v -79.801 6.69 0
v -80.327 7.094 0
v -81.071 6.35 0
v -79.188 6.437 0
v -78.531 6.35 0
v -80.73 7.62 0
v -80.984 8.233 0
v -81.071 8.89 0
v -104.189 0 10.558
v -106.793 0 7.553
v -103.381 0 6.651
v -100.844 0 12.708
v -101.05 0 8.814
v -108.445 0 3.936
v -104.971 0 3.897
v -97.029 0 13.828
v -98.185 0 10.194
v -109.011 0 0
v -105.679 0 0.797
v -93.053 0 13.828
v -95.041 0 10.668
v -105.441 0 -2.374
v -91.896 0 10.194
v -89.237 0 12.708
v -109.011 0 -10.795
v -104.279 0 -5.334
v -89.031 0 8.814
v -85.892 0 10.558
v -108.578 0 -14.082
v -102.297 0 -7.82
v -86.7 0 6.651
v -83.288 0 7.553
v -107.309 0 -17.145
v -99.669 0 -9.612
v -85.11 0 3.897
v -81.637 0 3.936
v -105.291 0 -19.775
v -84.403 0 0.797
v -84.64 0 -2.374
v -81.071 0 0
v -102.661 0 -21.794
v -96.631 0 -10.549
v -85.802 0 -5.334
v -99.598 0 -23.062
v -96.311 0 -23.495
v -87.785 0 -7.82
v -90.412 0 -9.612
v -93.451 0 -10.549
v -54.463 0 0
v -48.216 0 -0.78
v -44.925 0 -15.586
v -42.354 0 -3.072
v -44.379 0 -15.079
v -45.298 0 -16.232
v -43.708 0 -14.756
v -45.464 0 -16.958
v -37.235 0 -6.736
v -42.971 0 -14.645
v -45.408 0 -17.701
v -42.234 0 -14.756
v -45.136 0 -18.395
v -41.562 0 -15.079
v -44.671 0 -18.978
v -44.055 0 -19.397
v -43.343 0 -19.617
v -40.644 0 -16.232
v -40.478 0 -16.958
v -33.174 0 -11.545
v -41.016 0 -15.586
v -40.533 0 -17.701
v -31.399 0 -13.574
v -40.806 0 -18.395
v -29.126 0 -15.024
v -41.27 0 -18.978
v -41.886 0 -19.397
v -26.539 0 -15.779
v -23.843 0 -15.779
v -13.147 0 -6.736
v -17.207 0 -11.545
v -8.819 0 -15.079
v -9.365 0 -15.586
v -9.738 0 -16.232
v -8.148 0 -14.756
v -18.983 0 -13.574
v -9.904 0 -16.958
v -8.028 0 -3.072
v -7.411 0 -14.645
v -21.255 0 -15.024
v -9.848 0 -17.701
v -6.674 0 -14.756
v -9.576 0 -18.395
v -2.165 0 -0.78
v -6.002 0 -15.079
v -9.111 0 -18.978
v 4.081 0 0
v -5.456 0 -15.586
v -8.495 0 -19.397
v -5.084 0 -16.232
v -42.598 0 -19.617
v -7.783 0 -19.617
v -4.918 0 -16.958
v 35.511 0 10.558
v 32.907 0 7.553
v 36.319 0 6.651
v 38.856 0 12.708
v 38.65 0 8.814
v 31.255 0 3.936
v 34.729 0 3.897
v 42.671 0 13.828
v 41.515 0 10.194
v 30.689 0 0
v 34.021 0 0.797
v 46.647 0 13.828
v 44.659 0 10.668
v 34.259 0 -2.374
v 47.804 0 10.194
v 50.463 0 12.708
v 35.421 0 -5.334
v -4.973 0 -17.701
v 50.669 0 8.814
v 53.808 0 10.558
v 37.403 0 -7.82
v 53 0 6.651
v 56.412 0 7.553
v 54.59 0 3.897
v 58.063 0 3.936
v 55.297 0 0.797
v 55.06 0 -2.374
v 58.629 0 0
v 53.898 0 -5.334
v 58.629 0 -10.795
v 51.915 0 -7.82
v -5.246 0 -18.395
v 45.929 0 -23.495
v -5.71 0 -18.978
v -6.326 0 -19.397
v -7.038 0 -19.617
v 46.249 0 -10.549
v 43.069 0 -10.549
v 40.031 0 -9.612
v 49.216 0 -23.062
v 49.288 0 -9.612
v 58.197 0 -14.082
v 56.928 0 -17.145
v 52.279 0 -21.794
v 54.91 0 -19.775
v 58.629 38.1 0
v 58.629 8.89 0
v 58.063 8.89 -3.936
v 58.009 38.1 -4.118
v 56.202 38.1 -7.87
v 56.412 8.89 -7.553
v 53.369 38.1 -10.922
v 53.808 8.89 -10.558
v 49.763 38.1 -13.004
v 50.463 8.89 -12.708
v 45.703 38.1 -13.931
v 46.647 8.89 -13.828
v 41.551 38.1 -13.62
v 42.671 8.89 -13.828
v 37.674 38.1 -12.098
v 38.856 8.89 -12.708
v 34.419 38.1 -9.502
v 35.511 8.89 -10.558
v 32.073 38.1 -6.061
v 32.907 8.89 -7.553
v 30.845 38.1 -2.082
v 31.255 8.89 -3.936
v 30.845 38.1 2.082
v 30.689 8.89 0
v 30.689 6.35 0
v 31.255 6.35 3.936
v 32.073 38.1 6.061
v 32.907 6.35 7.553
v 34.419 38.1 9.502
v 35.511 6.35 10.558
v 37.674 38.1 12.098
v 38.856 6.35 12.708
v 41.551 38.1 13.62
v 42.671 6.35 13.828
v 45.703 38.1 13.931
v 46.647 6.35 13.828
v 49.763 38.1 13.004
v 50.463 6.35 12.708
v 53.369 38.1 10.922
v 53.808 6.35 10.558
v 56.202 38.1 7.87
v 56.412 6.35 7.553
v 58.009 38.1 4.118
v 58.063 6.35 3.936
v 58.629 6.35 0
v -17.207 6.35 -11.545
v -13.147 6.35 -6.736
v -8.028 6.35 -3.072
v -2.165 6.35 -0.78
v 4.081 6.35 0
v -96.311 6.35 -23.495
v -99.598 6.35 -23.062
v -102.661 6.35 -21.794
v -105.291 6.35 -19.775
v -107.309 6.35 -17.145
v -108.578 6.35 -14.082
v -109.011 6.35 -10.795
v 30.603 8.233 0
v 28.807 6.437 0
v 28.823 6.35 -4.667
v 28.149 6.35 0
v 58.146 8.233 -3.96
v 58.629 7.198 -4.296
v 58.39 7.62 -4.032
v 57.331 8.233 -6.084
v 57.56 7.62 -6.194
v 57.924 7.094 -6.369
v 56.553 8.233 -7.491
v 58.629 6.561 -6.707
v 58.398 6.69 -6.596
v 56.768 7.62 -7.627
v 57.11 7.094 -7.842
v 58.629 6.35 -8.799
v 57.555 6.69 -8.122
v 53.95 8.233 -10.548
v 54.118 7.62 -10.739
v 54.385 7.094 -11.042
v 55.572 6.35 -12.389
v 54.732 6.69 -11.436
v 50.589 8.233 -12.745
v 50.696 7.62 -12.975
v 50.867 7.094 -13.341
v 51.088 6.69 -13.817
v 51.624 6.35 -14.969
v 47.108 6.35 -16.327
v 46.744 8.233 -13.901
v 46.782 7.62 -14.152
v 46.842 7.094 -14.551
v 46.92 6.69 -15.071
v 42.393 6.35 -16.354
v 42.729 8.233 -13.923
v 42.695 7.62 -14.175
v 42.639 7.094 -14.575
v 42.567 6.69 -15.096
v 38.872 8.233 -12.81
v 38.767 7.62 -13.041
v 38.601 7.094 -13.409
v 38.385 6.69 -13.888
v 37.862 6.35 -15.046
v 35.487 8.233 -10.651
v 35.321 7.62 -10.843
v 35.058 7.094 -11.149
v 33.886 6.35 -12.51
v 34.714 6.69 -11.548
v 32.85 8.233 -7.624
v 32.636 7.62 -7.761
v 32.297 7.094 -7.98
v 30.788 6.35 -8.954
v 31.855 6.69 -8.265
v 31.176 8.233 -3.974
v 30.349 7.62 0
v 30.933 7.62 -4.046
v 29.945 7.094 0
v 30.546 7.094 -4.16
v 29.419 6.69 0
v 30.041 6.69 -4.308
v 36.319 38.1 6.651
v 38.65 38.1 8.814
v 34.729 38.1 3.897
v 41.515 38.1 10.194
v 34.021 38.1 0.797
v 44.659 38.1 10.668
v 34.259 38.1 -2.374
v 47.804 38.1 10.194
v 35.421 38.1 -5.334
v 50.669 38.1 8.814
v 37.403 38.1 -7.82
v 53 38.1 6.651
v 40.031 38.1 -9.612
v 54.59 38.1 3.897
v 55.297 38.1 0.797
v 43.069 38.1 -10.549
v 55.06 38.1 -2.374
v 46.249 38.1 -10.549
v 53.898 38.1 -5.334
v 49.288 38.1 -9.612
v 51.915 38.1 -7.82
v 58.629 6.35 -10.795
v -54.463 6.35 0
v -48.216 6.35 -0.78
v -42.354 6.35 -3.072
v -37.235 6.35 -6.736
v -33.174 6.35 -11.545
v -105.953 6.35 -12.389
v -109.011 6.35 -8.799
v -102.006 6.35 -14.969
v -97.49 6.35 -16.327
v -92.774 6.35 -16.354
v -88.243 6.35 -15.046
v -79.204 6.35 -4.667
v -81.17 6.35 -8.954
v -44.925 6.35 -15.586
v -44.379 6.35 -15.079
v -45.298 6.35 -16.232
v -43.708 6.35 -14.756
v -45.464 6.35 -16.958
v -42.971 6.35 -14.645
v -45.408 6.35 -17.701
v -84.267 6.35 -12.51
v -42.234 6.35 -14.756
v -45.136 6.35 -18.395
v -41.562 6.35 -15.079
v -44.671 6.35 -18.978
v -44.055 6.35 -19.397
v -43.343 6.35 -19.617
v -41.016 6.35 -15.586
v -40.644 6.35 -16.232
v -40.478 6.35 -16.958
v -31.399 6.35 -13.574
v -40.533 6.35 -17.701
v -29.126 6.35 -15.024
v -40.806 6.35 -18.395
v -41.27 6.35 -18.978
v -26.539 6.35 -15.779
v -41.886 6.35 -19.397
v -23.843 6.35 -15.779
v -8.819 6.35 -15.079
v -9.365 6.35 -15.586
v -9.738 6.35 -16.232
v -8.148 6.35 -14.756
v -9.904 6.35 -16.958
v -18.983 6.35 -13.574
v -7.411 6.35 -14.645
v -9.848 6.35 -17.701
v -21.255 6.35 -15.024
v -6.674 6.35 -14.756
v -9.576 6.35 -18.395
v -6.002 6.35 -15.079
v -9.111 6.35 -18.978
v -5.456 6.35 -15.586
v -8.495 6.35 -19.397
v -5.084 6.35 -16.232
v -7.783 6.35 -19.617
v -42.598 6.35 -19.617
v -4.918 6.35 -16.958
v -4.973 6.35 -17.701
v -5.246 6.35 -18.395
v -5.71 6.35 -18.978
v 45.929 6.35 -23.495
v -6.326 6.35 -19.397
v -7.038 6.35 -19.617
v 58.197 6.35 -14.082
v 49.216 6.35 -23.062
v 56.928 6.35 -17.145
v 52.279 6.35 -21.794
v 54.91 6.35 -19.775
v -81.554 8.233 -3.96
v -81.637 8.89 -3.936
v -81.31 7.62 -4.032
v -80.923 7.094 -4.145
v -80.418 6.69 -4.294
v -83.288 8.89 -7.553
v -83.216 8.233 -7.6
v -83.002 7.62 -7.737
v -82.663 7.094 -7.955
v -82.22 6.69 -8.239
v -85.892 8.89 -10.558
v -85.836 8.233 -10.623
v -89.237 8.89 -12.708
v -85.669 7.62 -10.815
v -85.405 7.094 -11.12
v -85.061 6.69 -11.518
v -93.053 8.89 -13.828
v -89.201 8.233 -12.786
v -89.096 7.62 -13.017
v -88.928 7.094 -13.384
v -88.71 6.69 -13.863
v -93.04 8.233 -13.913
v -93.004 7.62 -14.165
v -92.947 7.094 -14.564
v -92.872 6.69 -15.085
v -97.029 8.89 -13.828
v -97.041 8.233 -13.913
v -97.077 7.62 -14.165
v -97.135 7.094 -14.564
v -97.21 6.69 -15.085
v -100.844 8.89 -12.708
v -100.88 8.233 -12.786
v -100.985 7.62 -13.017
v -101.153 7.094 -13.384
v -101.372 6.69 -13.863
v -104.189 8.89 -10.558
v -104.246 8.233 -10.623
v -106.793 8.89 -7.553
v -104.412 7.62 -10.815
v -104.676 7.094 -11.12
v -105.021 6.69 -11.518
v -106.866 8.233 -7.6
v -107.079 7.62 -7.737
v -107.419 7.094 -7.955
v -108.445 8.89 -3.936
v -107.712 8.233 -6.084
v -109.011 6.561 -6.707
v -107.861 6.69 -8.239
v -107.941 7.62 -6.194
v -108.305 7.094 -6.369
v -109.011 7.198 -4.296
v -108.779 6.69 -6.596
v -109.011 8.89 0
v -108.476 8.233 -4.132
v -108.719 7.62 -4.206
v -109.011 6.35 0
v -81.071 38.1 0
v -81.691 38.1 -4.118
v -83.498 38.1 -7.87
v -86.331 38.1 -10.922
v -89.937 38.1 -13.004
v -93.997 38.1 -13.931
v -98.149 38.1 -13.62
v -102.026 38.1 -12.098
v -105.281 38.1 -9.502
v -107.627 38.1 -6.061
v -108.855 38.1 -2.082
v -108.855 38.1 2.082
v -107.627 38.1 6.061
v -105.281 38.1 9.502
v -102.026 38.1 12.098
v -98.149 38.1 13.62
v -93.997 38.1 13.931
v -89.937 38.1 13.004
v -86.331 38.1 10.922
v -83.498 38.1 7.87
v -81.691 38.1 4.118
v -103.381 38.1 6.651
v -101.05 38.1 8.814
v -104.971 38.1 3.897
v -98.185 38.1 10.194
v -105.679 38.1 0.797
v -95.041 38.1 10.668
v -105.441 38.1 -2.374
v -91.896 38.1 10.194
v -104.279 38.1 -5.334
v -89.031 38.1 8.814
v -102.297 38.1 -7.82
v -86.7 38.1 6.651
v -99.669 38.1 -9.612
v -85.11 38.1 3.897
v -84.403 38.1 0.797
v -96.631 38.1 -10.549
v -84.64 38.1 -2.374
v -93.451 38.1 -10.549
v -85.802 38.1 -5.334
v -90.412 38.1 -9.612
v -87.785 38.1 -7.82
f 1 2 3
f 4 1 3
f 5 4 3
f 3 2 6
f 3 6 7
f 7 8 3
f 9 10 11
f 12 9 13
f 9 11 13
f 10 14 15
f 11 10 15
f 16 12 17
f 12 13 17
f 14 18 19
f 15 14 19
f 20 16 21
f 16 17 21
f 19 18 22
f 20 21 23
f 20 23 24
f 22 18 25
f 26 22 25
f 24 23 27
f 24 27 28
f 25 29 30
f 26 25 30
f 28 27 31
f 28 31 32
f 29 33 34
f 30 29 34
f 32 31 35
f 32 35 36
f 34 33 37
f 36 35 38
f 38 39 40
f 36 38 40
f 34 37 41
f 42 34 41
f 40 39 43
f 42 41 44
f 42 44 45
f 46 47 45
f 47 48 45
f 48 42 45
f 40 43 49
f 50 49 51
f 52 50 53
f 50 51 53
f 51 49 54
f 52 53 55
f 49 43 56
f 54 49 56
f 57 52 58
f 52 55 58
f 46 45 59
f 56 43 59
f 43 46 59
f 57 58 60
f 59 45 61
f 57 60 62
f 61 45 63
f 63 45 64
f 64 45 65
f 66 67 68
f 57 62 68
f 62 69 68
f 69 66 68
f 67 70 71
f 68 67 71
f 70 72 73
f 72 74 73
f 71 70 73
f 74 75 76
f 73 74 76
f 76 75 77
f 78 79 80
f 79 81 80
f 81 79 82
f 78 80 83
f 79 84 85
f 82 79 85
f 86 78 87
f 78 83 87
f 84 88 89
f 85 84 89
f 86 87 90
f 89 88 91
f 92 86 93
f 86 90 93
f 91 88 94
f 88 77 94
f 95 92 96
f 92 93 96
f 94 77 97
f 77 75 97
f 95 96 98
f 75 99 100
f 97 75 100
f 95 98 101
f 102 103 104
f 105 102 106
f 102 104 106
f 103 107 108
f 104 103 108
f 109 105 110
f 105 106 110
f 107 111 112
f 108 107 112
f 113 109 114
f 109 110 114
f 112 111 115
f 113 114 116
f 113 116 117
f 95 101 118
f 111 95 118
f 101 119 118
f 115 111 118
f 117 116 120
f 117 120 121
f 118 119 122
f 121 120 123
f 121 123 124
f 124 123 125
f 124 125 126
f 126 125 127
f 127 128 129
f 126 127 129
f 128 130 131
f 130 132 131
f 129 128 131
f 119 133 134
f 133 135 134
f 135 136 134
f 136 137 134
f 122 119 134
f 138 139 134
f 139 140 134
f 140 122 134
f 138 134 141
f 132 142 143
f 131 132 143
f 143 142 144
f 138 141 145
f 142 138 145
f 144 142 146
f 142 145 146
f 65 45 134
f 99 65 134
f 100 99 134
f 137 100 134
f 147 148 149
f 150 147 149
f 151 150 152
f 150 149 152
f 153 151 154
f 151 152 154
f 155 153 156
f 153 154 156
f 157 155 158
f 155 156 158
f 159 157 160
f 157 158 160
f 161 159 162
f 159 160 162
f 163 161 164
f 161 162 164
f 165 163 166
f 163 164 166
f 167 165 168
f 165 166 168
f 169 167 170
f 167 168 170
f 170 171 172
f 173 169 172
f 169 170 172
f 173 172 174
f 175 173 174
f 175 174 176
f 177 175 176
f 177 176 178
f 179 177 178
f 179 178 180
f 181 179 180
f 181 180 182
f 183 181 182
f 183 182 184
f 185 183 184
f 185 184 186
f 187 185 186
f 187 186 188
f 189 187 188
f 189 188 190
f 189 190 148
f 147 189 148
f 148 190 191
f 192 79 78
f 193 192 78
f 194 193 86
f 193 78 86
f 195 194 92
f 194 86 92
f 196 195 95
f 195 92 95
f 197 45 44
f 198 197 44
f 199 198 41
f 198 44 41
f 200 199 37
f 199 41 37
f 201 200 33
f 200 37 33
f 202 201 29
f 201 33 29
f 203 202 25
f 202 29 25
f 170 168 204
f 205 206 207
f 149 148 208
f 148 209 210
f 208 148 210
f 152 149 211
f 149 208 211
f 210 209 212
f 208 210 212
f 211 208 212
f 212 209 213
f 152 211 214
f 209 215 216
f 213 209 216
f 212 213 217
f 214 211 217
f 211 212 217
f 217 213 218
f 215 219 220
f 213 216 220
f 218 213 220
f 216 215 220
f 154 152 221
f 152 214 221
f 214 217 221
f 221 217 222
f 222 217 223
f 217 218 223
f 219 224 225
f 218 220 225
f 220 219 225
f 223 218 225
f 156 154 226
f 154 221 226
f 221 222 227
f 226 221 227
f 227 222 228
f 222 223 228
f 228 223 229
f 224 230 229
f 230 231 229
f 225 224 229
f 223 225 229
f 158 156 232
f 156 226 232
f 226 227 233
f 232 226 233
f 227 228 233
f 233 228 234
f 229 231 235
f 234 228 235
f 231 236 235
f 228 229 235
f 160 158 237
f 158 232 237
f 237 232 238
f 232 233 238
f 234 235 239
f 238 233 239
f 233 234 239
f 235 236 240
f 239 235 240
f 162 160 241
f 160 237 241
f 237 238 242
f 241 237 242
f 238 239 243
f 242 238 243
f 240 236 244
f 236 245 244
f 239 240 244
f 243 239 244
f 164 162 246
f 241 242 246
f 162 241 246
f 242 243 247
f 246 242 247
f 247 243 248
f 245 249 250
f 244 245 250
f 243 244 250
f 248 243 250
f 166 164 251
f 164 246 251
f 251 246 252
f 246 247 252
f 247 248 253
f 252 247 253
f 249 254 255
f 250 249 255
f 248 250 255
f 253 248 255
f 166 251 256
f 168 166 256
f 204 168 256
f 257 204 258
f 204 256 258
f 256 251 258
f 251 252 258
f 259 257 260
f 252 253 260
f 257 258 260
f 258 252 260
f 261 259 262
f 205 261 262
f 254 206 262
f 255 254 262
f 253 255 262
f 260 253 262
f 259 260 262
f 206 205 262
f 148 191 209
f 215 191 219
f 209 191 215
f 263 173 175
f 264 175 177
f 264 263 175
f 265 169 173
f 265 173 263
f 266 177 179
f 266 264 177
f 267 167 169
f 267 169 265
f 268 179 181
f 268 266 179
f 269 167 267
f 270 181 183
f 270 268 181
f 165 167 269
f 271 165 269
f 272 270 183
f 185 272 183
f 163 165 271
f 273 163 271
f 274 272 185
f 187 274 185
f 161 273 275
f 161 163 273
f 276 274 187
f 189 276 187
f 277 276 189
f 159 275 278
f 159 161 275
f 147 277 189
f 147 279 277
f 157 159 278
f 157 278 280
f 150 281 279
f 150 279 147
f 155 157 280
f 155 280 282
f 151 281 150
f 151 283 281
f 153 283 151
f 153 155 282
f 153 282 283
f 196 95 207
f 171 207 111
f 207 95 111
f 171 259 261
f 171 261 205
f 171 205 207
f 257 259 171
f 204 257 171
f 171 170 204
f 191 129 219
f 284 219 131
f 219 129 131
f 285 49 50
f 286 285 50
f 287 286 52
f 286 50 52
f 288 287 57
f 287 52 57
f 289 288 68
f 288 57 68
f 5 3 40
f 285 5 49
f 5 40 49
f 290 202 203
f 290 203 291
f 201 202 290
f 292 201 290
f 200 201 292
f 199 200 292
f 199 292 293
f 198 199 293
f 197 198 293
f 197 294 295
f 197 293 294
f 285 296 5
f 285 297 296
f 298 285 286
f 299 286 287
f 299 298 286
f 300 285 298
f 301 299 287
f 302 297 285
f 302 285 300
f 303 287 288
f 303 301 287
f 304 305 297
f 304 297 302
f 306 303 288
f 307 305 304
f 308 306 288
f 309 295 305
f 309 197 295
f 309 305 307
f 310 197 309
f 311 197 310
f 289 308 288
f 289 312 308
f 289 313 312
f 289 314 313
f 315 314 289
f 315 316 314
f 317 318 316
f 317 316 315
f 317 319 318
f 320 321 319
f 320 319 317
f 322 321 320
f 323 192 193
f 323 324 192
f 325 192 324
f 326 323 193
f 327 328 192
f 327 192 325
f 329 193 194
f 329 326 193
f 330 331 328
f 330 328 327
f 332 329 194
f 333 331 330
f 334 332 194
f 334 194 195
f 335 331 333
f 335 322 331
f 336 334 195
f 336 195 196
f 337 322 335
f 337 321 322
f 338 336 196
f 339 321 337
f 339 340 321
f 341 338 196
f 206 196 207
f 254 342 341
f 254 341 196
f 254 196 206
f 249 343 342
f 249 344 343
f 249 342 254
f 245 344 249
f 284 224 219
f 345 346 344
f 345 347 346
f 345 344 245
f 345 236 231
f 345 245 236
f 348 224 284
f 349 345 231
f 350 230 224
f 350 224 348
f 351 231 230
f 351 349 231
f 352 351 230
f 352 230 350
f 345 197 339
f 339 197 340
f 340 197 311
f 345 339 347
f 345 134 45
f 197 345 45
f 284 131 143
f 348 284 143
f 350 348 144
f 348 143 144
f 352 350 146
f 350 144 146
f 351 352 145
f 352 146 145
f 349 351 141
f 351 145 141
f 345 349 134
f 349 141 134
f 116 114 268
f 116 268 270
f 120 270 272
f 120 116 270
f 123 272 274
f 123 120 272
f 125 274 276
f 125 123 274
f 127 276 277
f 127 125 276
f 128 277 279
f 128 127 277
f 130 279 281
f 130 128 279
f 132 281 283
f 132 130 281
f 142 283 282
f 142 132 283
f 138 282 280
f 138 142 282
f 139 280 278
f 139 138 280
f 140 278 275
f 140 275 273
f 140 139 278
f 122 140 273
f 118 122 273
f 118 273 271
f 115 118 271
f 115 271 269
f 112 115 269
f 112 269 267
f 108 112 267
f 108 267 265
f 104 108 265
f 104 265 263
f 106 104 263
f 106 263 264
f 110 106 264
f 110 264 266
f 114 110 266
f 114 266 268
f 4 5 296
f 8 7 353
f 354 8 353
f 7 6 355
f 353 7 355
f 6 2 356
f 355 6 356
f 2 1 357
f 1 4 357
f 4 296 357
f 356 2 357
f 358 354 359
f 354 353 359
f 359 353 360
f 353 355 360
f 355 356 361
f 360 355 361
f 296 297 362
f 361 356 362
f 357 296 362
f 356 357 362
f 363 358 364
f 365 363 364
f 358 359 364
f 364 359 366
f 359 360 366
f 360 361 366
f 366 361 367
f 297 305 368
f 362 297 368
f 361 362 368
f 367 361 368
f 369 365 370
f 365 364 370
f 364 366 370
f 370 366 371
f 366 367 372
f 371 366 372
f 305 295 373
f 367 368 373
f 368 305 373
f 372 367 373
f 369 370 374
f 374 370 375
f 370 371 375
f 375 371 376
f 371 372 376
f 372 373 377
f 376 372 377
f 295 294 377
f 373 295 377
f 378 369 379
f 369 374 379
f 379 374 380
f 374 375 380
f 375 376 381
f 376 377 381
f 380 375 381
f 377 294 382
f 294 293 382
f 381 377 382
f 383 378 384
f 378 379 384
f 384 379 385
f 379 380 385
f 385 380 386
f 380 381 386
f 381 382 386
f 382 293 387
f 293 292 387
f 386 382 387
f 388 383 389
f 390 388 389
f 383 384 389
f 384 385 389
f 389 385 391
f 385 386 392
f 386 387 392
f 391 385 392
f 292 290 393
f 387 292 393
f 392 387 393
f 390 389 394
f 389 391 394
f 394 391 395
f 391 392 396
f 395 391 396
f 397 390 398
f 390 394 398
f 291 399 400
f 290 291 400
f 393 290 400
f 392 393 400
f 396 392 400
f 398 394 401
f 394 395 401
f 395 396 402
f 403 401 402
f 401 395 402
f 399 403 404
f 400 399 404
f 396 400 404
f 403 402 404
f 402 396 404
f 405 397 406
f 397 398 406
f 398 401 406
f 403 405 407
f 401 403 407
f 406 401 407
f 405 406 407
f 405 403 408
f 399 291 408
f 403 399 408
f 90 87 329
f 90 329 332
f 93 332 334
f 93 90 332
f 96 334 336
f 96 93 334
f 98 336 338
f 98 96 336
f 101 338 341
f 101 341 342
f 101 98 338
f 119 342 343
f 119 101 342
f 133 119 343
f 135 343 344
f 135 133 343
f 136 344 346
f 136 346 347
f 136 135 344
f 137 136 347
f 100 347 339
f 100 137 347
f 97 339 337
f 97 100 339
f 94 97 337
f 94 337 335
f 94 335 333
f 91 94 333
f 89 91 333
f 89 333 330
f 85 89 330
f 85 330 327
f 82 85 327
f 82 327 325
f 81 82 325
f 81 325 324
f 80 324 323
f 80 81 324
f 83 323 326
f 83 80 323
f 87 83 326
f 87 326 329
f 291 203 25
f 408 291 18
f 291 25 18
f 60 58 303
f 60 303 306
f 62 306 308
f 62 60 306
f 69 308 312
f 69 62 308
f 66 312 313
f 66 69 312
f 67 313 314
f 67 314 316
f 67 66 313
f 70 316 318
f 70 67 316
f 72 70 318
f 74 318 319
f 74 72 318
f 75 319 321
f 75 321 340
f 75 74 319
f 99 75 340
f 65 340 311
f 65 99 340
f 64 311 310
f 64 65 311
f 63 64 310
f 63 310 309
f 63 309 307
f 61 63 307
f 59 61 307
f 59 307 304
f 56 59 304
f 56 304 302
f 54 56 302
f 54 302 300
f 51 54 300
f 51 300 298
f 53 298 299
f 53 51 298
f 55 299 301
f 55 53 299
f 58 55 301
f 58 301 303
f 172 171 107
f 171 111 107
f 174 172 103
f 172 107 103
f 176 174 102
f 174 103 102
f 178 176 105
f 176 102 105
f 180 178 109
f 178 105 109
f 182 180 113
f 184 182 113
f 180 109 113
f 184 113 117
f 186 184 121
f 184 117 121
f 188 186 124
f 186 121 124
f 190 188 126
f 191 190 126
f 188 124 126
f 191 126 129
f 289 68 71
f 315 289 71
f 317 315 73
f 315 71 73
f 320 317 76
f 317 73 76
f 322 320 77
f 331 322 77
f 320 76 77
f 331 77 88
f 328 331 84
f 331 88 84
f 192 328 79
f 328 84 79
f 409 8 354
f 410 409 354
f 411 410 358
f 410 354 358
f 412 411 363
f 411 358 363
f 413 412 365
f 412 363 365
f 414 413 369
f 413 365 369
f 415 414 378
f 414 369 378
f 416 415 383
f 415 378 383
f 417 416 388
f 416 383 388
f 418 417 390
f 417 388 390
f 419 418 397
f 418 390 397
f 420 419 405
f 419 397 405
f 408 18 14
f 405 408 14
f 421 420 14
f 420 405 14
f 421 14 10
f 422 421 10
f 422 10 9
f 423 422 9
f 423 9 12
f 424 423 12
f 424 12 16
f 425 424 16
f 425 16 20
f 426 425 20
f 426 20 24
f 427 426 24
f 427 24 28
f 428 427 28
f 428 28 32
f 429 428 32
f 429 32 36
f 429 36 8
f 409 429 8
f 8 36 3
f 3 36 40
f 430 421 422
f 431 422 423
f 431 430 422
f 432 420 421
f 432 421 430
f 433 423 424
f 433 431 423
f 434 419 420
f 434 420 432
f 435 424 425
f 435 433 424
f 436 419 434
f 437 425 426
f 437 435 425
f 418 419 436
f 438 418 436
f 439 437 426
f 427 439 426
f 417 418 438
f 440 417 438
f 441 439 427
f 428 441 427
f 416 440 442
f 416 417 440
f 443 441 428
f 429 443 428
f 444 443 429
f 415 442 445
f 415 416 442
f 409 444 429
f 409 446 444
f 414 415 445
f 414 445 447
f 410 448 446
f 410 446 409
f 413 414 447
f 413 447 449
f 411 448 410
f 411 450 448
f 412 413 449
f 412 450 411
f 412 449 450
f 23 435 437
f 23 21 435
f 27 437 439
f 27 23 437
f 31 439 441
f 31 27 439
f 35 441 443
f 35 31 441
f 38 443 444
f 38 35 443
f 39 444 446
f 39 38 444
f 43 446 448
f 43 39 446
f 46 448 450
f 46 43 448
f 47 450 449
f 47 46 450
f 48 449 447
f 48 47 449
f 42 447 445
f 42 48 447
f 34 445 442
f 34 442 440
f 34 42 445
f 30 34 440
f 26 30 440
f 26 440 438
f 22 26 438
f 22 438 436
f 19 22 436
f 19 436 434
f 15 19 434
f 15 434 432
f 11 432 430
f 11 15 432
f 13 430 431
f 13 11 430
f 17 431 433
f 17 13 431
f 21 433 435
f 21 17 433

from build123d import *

# Parameters (mm, degrees)
SKETCH1_R           = 10.668
SKETCH1_R_2         = 2.5
BOSS_EXTRUDE1_DEPTH = 6.35
SKETCH2_R           = 13.97
SKETCH2_R_2         = 10.668
BOSS_EXTRUDE2_DEPTH = 31.75
FILLET1_R           = 2.54


with BuildPart() as part:
    # Sketch1 → Boss-Extrude1 (new body)
    with BuildSketch(Plane(origin=(0, 0, 0), x_dir=(1, 0, 0), z_dir=(0, 1, 0))):
        with BuildLine():
            Line((-81.070713968, 0), (-54.46276762, 0))
            ThreePointArc((-54.46276762, 0), (-42.353792737, 3.072153546), (-33.174001328, 11.545454545))
            ThreePointArc((-33.174001328, 11.545454545), (-25.190713968, 15.875), (-17.207426609, 11.545454545))
            ThreePointArc((-17.207426609, 11.545454545), (-8.0276352, 3.072153546), (4.081339684, 0))
            Line((4.081339684, 0), (30.689286032, 0))
            ThreePointArc((30.689286032, 0), (44.659286032, -13.97), (58.629286032, 0))
            Line((58.629286032, 0), (58.629286032, 10.795))
            ThreePointArc((58.629286032, 10.795), (54.909542153, 19.775256121), (45.929286032, 23.495))
            Line((45.929286032, 23.495), (-96.310713968, 23.495))
            ThreePointArc((-96.310713968, 23.495), (-105.290970089, 19.775256121), (-109.010713968, 10.795))
            Line((-109.010713968, 10.795), (-109.010713968, 0))
            ThreePointArc((-109.010713968, 0), (-95.040713968, -13.97), (-81.070713968, 0))
        make_face()
        with Locations(Location((-95.040713968, 0, 0), (0, 0, 270))):
            Circle(SKETCH1_R, mode=Mode.SUBTRACT)
        with Locations(Location((44.659286032, 0, 0), (0, 0, 270))):
            Circle(SKETCH1_R, mode=Mode.SUBTRACT)
        with Locations(Location((-7.410713968, 17.145, 0), (0, 0, 270))):
            Circle(SKETCH1_R_2, mode=Mode.SUBTRACT)
        with Locations(Location((-42.970713968, 17.145, 0), (0, 0, 270))):
            Circle(SKETCH1_R_2, mode=Mode.SUBTRACT)
    extrude(amount=BOSS_EXTRUDE1_DEPTH)

    # Sketch2 → Boss-Extrude2 (add)
    # profile 1 of 2: a face of its own
    with BuildSketch(Plane(origin=(0, 6.35, 0), x_dir=(1, 0, 0), z_dir=(0, 1, 0))):
        with Locations((-95.040713968, 0)):
            Circle(SKETCH2_R)
        with Locations(Location((-95.040713968, 0, 0), (0, 0, 270))):
            Circle(SKETCH2_R_2, mode=Mode.SUBTRACT)
    # profile 2 of 2: a face of its own
    with BuildSketch(Plane(origin=(0, 6.35, 0), x_dir=(1, 0, 0), z_dir=(0, 1, 0))):
        with Locations((44.659286032, 0)):
            Circle(SKETCH2_R)
        with Locations(Location((44.659286032, 0, 0), (0, 0, 270))):
            Circle(SKETCH2_R_2, mode=Mode.SUBTRACT)
    extrude(amount=BOSS_EXTRUDE2_DEPTH)

    # Fillet1
    # the kernel refuses this fillet: 2.54 mm, written as the material it adds along each edge
    with BuildSketch(Plane(origin=(-95.040713968, 6.35, 0), x_dir=(1, 0, 0), z_dir=(0, 0, 1))) as fillet1_piece_1_section:
        with BuildLine():
            CenterArc((13.97 + FILLET1_R, FILLET1_R), FILLET1_R, 180, 90)
            Line((13.97, FILLET1_R), (13.97, 0))
            Line((13.97, 0), (13.97 + FILLET1_R, 0))
        make_face()
    fillet1_piece_1 = revolve(axis=Axis((-95.040713968, 6.35, 0), (0, 1, 0)), revolution_arc=180, mode=Mode.PRIVATE)
    fillet1_piece_1 = split(fillet1_piece_1, bisect_by=Plane(origin=(-109.010713968, 7.066562121, -14.686562121), z_dir=(1, 0, 0)), keep=Keep.TOP, mode=Mode.PRIVATE)
    add(fillet1_piece_1)
    with BuildSketch(Plane(origin=(44.659286032, 6.35, 0), x_dir=(1, 0, 0), z_dir=(0, 0, 1))) as fillet1_piece_2_section:
        with BuildLine():
            CenterArc((13.97 + FILLET1_R, FILLET1_R), FILLET1_R, 180, 90)
            Line((13.97, FILLET1_R), (13.97, 0))
            Line((13.97, 0), (13.97 + FILLET1_R, 0))
        make_face()
    fillet1_piece_2 = revolve(axis=Axis((44.659286032, 6.35, 0), (0, 1, 0)), revolution_arc=180, mode=Mode.PRIVATE)
    fillet1_piece_2 = split(fillet1_piece_2, bisect_by=Plane(origin=(58.629286032, 7.62, -14.008730581), z_dir=(-1, 0, 0)), keep=Keep.TOP, mode=Mode.PRIVATE)
    add(fillet1_piece_2)


solid = part.part
